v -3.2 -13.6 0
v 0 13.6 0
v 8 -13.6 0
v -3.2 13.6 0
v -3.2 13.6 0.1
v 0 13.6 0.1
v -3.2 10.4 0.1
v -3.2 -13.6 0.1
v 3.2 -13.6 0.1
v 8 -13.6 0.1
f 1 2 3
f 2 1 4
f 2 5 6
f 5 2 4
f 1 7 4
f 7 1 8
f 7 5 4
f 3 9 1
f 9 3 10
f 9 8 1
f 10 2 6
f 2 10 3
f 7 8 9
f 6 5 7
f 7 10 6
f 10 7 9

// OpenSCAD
// file: ../p/4-4edge.scad
use <../lib.scad>
$fa=1; $fs=0.2;
function ldraw_lib__4_4edge(realsolid=false) = [
// 0 Circle 1.0
// 0 Name: 4-4edge.dat
// 0 Author: James Jessiman
// 0 !LDRAW_ORG Primitive UPDATE 2017-01
// 0 !LICENSE Licensed under CC BY 2.0 and CC BY 4.0 : see CAreadme.txt
// 
// 0 BFC CERTIFY CCW
  [0,"BFC","CERTIFY"],
  [0,"BFC","CCW"],
// 
// 0 !HISTORY 1998-12-15 [PTadmin] Official Update 1998-10
// 0 !HISTORY 2005-12-28 [PTadmin] Official Update 2005-01
// 0 !HISTORY 2007-06-24 [PTadmin] Header formatted for Contributor Agreement
// 0 !HISTORY 2008-07-01 [PTadmin] Official Update 2008-01
// 0 !HISTORY 2017-01-15 [Steffen] BFCed
// 0 !HISTORY 2017-12-30 [PTadmin] Official Update 2017-01
// 
// 
// 2 24 1 0 0 0.9239 0 0.3827
  [2,24,1,0,0,0.9239,0,0.3827],
// 2 24 0.9239 0 0.3827 0.7071 0 0.7071
  [2,24,0.9239,0,0.3827,0.7071,0,0.7071],
// 2 24 0.7071 0 0.7071 0.3827 0 0.9239
  [2,24,0.7071,0,0.7071,0.3827,0,0.9239],
// 2 24 0.3827 0 0.9239 0 0 1
  [2,24,0.3827,0,0.9239,0,0,1],
// 2 24 0 0 1 -0.3827 0 0.9239
  [2,24,0,0,1,-0.3827,0,0.9239],
// 2 24 -0.3827 0 0.9239 -0.7071 0 0.7071
  [2,24,-0.3827,0,0.9239,-0.7071,0,0.7071],
// 2 24 -0.7071 0 0.7071 -0.9239 0 0.3827
  [2,24,-0.7071,0,0.7071,-0.9239,0,0.3827],
// 2 24 -0.9239 0 0.3827 -1 0 -0
  [2,24,-0.9239,0,0.3827,-1,0,-0],
// 2 24 -1 0 -0 -0.9239 0 -0.3827
  [2,24,-1,0,-0,-0.9239,0,-0.3827],
// 2 24 -0.9239 0 -0.3827 -0.7071 0 -0.7071
  [2,24,-0.9239,0,-0.3827,-0.7071,0,-0.7071],
// 2 24 -0.7071 0 -0.7071 -0.3827 0 -0.9239
  [2,24,-0.7071,0,-0.7071,-0.3827,0,-0.9239],
// 2 24 -0.3827 0 -0.9239 0 0 -1
  [2,24,-0.3827,0,-0.9239,0,0,-1],
// 2 24 0 0 -1 0.3827 0 -0.9239
  [2,24,0,0,-1,0.3827,0,-0.9239],
// 2 24 0.3827 0 -0.9239 0.7071 0 -0.7071
  [2,24,0.3827,0,-0.9239,0.7071,0,-0.7071],
// 2 24 0.7071 0 -0.7071 0.9239 0 -0.3827
  [2,24,0.7071,0,-0.7071,0.9239,0,-0.3827],
// 2 24 0.9239 0 -0.3827 1 0 0
  [2,24,0.9239,0,-0.3827,1,0,0],
];
module ldraw_lib__4_4edge(step=0, col=false, unit=2/5, alt=false, line=0.2, solid=!$preview)
    makepoly(ldraw_lib__4_4edge(solid), step=step, col=col, unit=unit, alt=alt, line=line, solid=solid);
ldraw_lib__4_4edge(line=0.2);
// file: ../p/4-4disc.scad
use <../lib.scad>
$fa=1; $fs=0.2;
function ldraw_lib__4_4disc(realsolid=false) = [
// 0 Disc 1.0
// 0 Name: 4-4disc.dat
// 0 Author: James Jessiman
// 0 !LDRAW_ORG Primitive UPDATE 2002-02
// 0 !LICENSE Licensed under CC BY 2.0 and CC BY 4.0 : see CAreadme.txt
// 
// 0 BFC CERTIFY CCW
  [0,"BFC","CERTIFY"],
  [0,"BFC","CCW"],
// 
// 0 !HISTORY 1998-12-15 [PTadmin] Official Update 1998-10
// 0 !HISTORY 2002-03-23 [sbliss] Added BFC statement
// 0 !HISTORY 2002-04-25 [PTadmin] Official Update 2002-02
// 0 !HISTORY 2007-06-24 [PTadmin] Header formatted for Contributor Agreement
// 0 !HISTORY 2008-07-01 [PTadmin] Official Update 2008-01
// 
// 
// 3 16 0 0 0 1 0 0 0.9239 0 0.3827
  [3,16,0,0,0,1,0,0,0.9239,0,0.3827],
// 3 16 0 0 0 0.9239 0 0.3827 0.7071 0 0.7071
  [3,16,0,0,0,0.9239,0,0.3827,0.7071,0,0.7071],
// 3 16 0 0 0 0.7071 0 0.7071 0.3827 0 0.9239
  [3,16,0,0,0,0.7071,0,0.7071,0.3827,0,0.9239],
// 3 16 0 0 0 0.3827 0 0.9239 0 0 1
  [3,16,0,0,0,0.3827,0,0.9239,0,0,1],
// 3 16 0 0 0 0 0 1 -0.3827 0 0.9239
  [3,16,0,0,0,0,0,1,-0.3827,0,0.9239],
// 3 16 0 0 0 -0.3827 0 0.9239 -0.7071 0 0.7071
  [3,16,0,0,0,-0.3827,0,0.9239,-0.7071,0,0.7071],
// 3 16 0 0 0 -0.7071 0 0.7071 -0.9239 0 0.3827
  [3,16,0,0,0,-0.7071,0,0.7071,-0.9239,0,0.3827],
// 3 16 0 0 0 -0.9239 0 0.3827 -1 0 -0
  [3,16,0,0,0,-0.9239,0,0.3827,-1,0,-0],
// 3 16 0 0 0 -1 0 -0 -0.9239 0 -0.3827
  [3,16,0,0,0,-1,0,-0,-0.9239,0,-0.3827],
// 3 16 0 0 0 -0.9239 0 -0.3827 -0.7071 0 -0.7071
  [3,16,0,0,0,-0.9239,0,-0.3827,-0.7071,0,-0.7071],
// 3 16 0 0 0 -0.7071 0 -0.7071 -0.3827 0 -0.9239
  [3,16,0,0,0,-0.7071,0,-0.7071,-0.3827,0,-0.9239],
// 3 16 0 0 0 -0.3827 0 -0.9239 0 0 -1
  [3,16,0,0,0,-0.3827,0,-0.9239,0,0,-1],
// 3 16 0 0 0 0 0 -1 0.3827 0 -0.9239
  [3,16,0,0,0,0,0,-1,0.3827,0,-0.9239],
// 3 16 0 0 0 0.3827 0 -0.9239 0.7071 0 -0.7071
  [3,16,0,0,0,0.3827,0,-0.9239,0.7071,0,-0.7071],
// 3 16 0 0 0 0.7071 0 -0.7071 0.9239 0 -0.3827
  [3,16,0,0,0,0.7071,0,-0.7071,0.9239,0,-0.3827],
// 3 16 0 0 0 0.9239 0 -0.3827 1 0 0
  [3,16,0,0,0,0.9239,0,-0.3827,1,0,0],
// 0
];
module ldraw_lib__4_4disc(step=0, col=false, unit=2/5, alt=false, line=0.2, solid=!$preview)
    makepoly(ldraw_lib__4_4disc(solid), step=step, col=col, unit=unit, alt=alt, line=line, solid=solid);
ldraw_lib__4_4disc(line=0.2);
// file: ../p/4-4cyli.scad
use <../lib.scad>
$fa=1; $fs=0.2;
function ldraw_lib__4_4cyli(realsolid=false) = [
// 0 Cylinder 1.0
// 0 Name: 4-4cyli.dat
// 0 Author: James Jessiman
// 0 !LDRAW_ORG Primitive UPDATE 2005-01
// 0 !LICENSE Licensed under CC BY 2.0 and CC BY 4.0 : see CAreadme.txt
// 
// 0 BFC CERTIFY CCW
  [0,"BFC","CERTIFY"],
  [0,"BFC","CCW"],
// 
// 0 !HISTORY 1998-12-15 [PTadmin] Official Update 1998-10
// 0 !HISTORY 2002-03-23 [sbliss] Added BFC statement; merged headers from files in distributions LDraw 0.27 and Complete.
// 0 !HISTORY 2002-04-25 [PTadmin] Official Update 2002-02
// 0 !HISTORY 2004-12-14 [guyvivan] BFC CCW
// 0 !HISTORY 2005-12-28 [PTadmin] Official Update 2005-01
// 0 !HISTORY 2007-06-24 [PTadmin] Header formatted for Contributor Agreement
// 0 !HISTORY 2008-07-01 [PTadmin] Official Update 2008-01
// 
// 
// 4 16 1 1 0 0.9239 1 0.3827 0.9239 0 0.3827 1 0 0
  [4,16,1,1,0,0.9239,1,0.3827,0.9239,0,0.3827,1,0,0],
// 5 24 1 0 0 1 1 0 0.9239 0 0.3827 0.9239 0 -0.3827
  [5,24,1,0,0,1,1,0,0.9239,0,0.3827,0.9239,0,-0.3827],
// 4 16 0.9239 1 0.3827 0.7071 1 0.7071 0.7071 0 0.7071 0.9239 0 0.3827
  [4,16,0.9239,1,0.3827,0.7071,1,0.7071,0.7071,0,0.7071,0.9239,0,0.3827],
// 5 24 0.9239 0 0.3827 0.9239 1 0.3827 0.7071 0 0.7071 1 0 0
  [5,24,0.9239,0,0.3827,0.9239,1,0.3827,0.7071,0,0.7071,1,0,0],
// 4 16 0.7071 1 0.7071 0.3827 1 0.9239 0.3827 0 0.9239 0.7071 0 0.7071
  [4,16,0.7071,1,0.7071,0.3827,1,0.9239,0.3827,0,0.9239,0.7071,0,0.7071],
// 5 24 0.7071 0 0.7071 0.7071 1 0.7071 0.3827 0 0.9239 0.9239 0 0.3827
  [5,24,0.7071,0,0.7071,0.7071,1,0.7071,0.3827,0,0.9239,0.9239,0,0.3827],
// 4 16 0.3827 1 0.9239 0 1 1 0 0 1 0.3827 0 0.9239
  [4,16,0.3827,1,0.9239,0,1,1,0,0,1,0.3827,0,0.9239],
// 5 24 0.3827 0 0.9239 0.3827 1 0.9239 0 0 1 0.7071 0 0.7071
  [5,24,0.3827,0,0.9239,0.3827,1,0.9239,0,0,1,0.7071,0,0.7071],
// 4 16 0 1 1 -0.3827 1 0.9239 -0.3827 0 0.9239 0 0 1
  [4,16,0,1,1,-0.3827,1,0.9239,-0.3827,0,0.9239,0,0,1],
// 5 24 0 0 1 0 1 1 -0.3827 0 0.9239 0.3827 0 0.9239
  [5,24,0,0,1,0,1,1,-0.3827,0,0.9239,0.3827,0,0.9239],
// 4 16 -0.3827 1 0.9239 -0.7071 1 0.7071 -0.7071 0 0.7071 -0.3827 0 0.9239
  [4,16,-0.3827,1,0.9239,-0.7071,1,0.7071,-0.7071,0,0.7071,-0.3827,0,0.9239],
// 5 24 -0.3827 0 0.9239 -0.3827 1 0.9239 -0.7071 0 0.7071 0 0 1
  [5,24,-0.3827,0,0.9239,-0.3827,1,0.9239,-0.7071,0,0.7071,0,0,1],
// 4 16 -0.7071 1 0.7071 -0.9239 1 0.3827 -0.9239 0 0.3827 -0.7071 0 0.7071
  [4,16,-0.7071,1,0.7071,-0.9239,1,0.3827,-0.9239,0,0.3827,-0.7071,0,0.7071],
// 5 24 -0.7071 0 0.7071 -0.7071 1 0.7071 -0.9239 0 0.3827 -0.3827 0 0.9239
  [5,24,-0.7071,0,0.7071,-0.7071,1,0.7071,-0.9239,0,0.3827,-0.3827,0,0.9239],
// 4 16 -0.9239 1 0.3827 -1 1 0 -1 0 0 -0.9239 0 0.3827
  [4,16,-0.9239,1,0.3827,-1,1,0,-1,0,0,-0.9239,0,0.3827],
// 5 24 -0.9239 0 0.3827 -0.9239 1 0.3827 -1 0 0 -0.7071 0 0.7071
  [5,24,-0.9239,0,0.3827,-0.9239,1,0.3827,-1,0,0,-0.7071,0,0.7071],
// 4 16 -1 1 0 -0.9239 1 -0.3827 -0.9239 0 -0.3827 -1 0 0
  [4,16,-1,1,0,-0.9239,1,-0.3827,-0.9239,0,-0.3827,-1,0,0],
// 5 24 -1 0 0 -1 1 0 -0.9239 0 -0.3827 -0.9239 0 0.3827
  [5,24,-1,0,0,-1,1,0,-0.9239,0,-0.3827,-0.9239,0,0.3827],
// 4 16 -0.9239 1 -0.3827 -0.7071 1 -0.7071 -0.7071 0 -0.7071 -0.9239 0 -0.3827
  [4,16,-0.9239,1,-0.3827,-0.7071,1,-0.7071,-0.7071,0,-0.7071,-0.9239,0,-0.3827],
// 5 24 -0.9239 0 -0.3827 -0.9239 1 -0.3827 -0.7071 0 -0.7071 -1 0 0
  [5,24,-0.9239,0,-0.3827,-0.9239,1,-0.3827,-0.7071,0,-0.7071,-1,0,0],
// 4 16 -0.7071 1 -0.7071 -0.3827 1 -0.9239 -0.3827 0 -0.9239 -0.7071 0 -0.7071
  [4,16,-0.7071,1,-0.7071,-0.3827,1,-0.9239,-0.3827,0,-0.9239,-0.7071,0,-0.7071],
// 5 24 -0.7071 0 -0.7071 -0.7071 1 -0.7071 -0.3827 0 -0.9239 -0.9239 0 -0.3827
  [5,24,-0.7071,0,-0.7071,-0.7071,1,-0.7071,-0.3827,0,-0.9239,-0.9239,0,-0.3827],
// 4 16 -0.3827 1 -0.9239 0 1 -1 0 0 -1 -0.3827 0 -0.9239
  [4,16,-0.3827,1,-0.9239,0,1,-1,0,0,-1,-0.3827,0,-0.9239],
// 5 24 -0.3827 0 -0.9239 -0.3827 1 -0.9239 0 0 -1 -0.7071 0 -0.7071
  [5,24,-0.3827,0,-0.9239,-0.3827,1,-0.9239,0,0,-1,-0.7071,0,-0.7071],
// 4 16 0 1 -1 0.3827 1 -0.9239 0.3827 0 -0.9239 0 0 -1
  [4,16,0,1,-1,0.3827,1,-0.9239,0.3827,0,-0.9239,0,0,-1],
// 5 24 0 0 -1 0 1 -1 0.3827 0 -0.9239 -0.3827 0 -0.9239
  [5,24,0,0,-1,0,1,-1,0.3827,0,-0.9239,-0.3827,0,-0.9239],
// 4 16 0.3827 1 -0.9239 0.7071 1 -0.7071 0.7071 0 -0.7071 0.3827 0 -0.9239
  [4,16,0.3827,1,-0.9239,0.7071,1,-0.7071,0.7071,0,-0.7071,0.3827,0,-0.9239],
// 5 24 0.3827 0 -0.9239 0.3827 1 -0.9239 0.7071 0 -0.7071 0 0 -1
  [5,24,0.3827,0,-0.9239,0.3827,1,-0.9239,0.7071,0,-0.7071,0,0,-1],
// 4 16 0.7071 1 -0.7071 0.9239 1 -0.3827 0.9239 0 -0.3827 0.7071 0 -0.7071
  [4,16,0.7071,1,-0.7071,0.9239,1,-0.3827,0.9239,0,-0.3827,0.7071,0,-0.7071],
// 5 24 0.7071 0 -0.7071 0.7071 1 -0.7071 0.9239 0 -0.3827 0.3827 0 -0.9239
  [5,24,0.7071,0,-0.7071,0.7071,1,-0.7071,0.9239,0,-0.3827,0.3827,0,-0.9239],
// 4 16 0.9239 1 -0.3827 1 1 0 1 0 0 0.9239 0 -0.3827
  [4,16,0.9239,1,-0.3827,1,1,0,1,0,0,0.9239,0,-0.3827],
// 5 24 0.9239 0 -0.3827 0.9239 1 -0.3827 1 0 0 0.7071 0 -0.7071
  [5,24,0.9239,0,-0.3827,0.9239,1,-0.3827,1,0,0,0.7071,0,-0.7071],
// 0
];
module ldraw_lib__4_4cyli(step=0, col=false, unit=2/5, alt=false, line=0.2, solid=!$preview)
    makepoly(ldraw_lib__4_4cyli(solid), step=step, col=col, unit=unit, alt=alt, line=line, solid=solid);
ldraw_lib__4_4cyli(line=0.2);
// file: ../p/stud3.scad
use <../lib.scad>
use <4-4cyli.scad>
use <4-4disc.scad>
use <4-4edge.scad>
$fa=1; $fs=0.2;
function ldraw_lib__stud3(realsolid=false) = realsolid ? 
    [openscad(translate([0,0,-eps()], o=cylinder(4+eps(), r=4)),2)] : [
// 0 Stud Tube Solid
// 0 Name: stud3.dat
// 0 Author: James Jessiman
// 0 !LDRAW_ORG Primitive UPDATE 2012-01
// 0 !LICENSE Licensed under CC BY 2.0 and CC BY 4.0 : see CAreadme.txt
// 
// 0 BFC CERTIFY CCW
  [0,"BFC","CERTIFY"],
  [0,"BFC","CCW"],
// 
// 0 !HISTORY 2002-04-04 [sbliss] Modified for BFC compliance
// 0 !HISTORY 2002-04-25 [PTadmin] Official Update 2002-02
// 0 !HISTORY 2007-06-24 [PTadmin] Header formatted for Contributor Agreement
// 0 !HISTORY 2008-07-01 [PTadmin] Official Update 2008-01
// 0 !HISTORY 2012-02-16 [Philo] Changed to CCW
// 0 !HISTORY 2012-03-30 [PTadmin] Official Update 2012-01
// 
// 
// 1 16 0 -4 0 4 0 0 0 1 0 0 0 4 4-4edge.dat
  [1,16,0,-4,0,4,0,0,0,1,0,0,0,4, ldraw_lib__4_4edge(realsolid)],
// 1 16 0 0 0 4 0 0 0 1 0 0 0 4 4-4edge.dat
  [1,16,0,0,0,4,0,0,0,1,0,0,0,4, ldraw_lib__4_4edge(realsolid)],
// 1 16 0 -4 0 4 0 0 0 1 0 0 0 4 4-4disc.dat
  [1,16,0,-4,0,4,0,0,0,1,0,0,0,4, ldraw_lib__4_4disc(realsolid)],
// 1 16 0 -4 0 4 0 0 0 4 0 0 0 4 4-4cyli.dat
  [1,16,0,-4,0,4,0,0,0,4,0,0,0,4, ldraw_lib__4_4cyli(realsolid)],
];
module ldraw_lib__stud3(step=0, col=false, unit=2/5, alt=false, line=0.2, solid=!$preview)
    makepoly(ldraw_lib__stud3(solid), step=step, col=col, unit=unit, alt=alt, line=line, solid=solid);
ldraw_lib__stud3(line=0.2);
// file: ../p/stud.scad
use <../lib.scad>
use <4-4cyli.scad>
use <4-4disc.scad>
use <4-4edge.scad>
$fa=1; $fs=0.2;
function ldraw_lib__stud(realsolid=false) = realsolid ? 
    [openscad(translate([0,0,-eps()], o=cylinder(4+eps(), r=6)),2)] : [
// 0 Stud
// 0 Name: stud.dat
// 0 Author: James Jessiman
// 0 !LDRAW_ORG Primitive UPDATE 2012-01
// 0 !LICENSE Licensed under CC BY 2.0 and CC BY 4.0 : see CAreadme.txt
// 
// 0 BFC CERTIFY CCW
  [0,"BFC","CERTIFY"],
  [0,"BFC","CCW"],
// 
// 0 !HISTORY 2002-04-04 [sbliss] Modified for BFC compliance
// 0 !HISTORY 2002-04-25 [PTadmin] Official Update 2002-02
// 0 !HISTORY 2007-06-24 [PTadmin] Header formatted for Contributor Agreement
// 0 !HISTORY 2008-07-01 [PTadmin] Official Update 2008-01
// 0 !HISTORY 2012-02-16 [Philo] Changed to CCW
// 0 !HISTORY 2012-03-30 [PTadmin] Official Update 2012-01
// 
// 
// 1 16 0 0 0 6 0 0 0 1 0 0 0 6 4-4edge.dat
  [1,16,0,0,0,6,0,0,0,1,0,0,0,6, ldraw_lib__4_4edge(realsolid)],
// 1 16 0 -4 0 6 0 0 0 1 0 0 0 6 4-4edge.dat
  [1,16,0,-4,0,6,0,0,0,1,0,0,0,6, ldraw_lib__4_4edge(realsolid)],
// 1 16 0 0 0 6 0 0 0 -4 0 0 0 6 4-4cyli.dat
  [1,16,0,0,0,6,0,0,0,-4,0,0,0,6, ldraw_lib__4_4cyli(realsolid)],
// 1 16 0 -4 0 6 0 0 0 1 0 0 0 6 4-4disc.dat
  [1,16,0,-4,0,6,0,0,0,1,0,0,0,6, ldraw_lib__4_4disc(realsolid)],
];
module ldraw_lib__stud(step=0, col=false, unit=2/5, alt=false, line=0.2, solid=!$preview)
    makepoly(ldraw_lib__stud(solid), step=step, col=col, unit=unit, alt=alt, line=line, solid=solid);
ldraw_lib__stud(line=0.2);
// file: ../p/box5.scad
use <../lib.scad>
$fa=1; $fs=0.2;
function ldraw_lib__box5(realsolid=false) = [
// 0 Box with 5 Faces and All Edges
// 0 Name: box5.dat
// 0 Author: James Jessiman
// 0 !LDRAW_ORG Primitive UPDATE 2012-01
// 0 !LICENSE Licensed under CC BY 2.0 and CC BY 4.0 : see CAreadme.txt
// 
// 0 BFC CERTIFY CCW
  [0,"BFC","CERTIFY"],
  [0,"BFC","CCW"],
// 
// 0 !HISTORY 2002-04-03 [sbliss] Modified for BFC compliance
// 0 !HISTORY 2002-04-25 [PTadmin] Official Update 2002-02
// 0 !HISTORY 2007-06-24 [PTadmin] Header formatted for Contributor Agreement
// 0 !HISTORY 2008-07-01 [PTadmin] Official Update 2008-01
// 0 !HISTORY 2012-02-16 [Philo] Changed to CCW
// 0 !HISTORY 2012-03-30 [PTadmin] Official Update 2012-01
// 
// 
// 2 24 1 1 1 -1 1 1
  [2,24,1,1,1,-1,1,1],
// 2 24 -1 1 1 -1 1 -1
  [2,24,-1,1,1,-1,1,-1],
// 2 24 -1 1 -1 1 1 -1
  [2,24,-1,1,-1,1,1,-1],
// 2 24 1 1 -1 1 1 1
  [2,24,1,1,-1,1,1,1],
// 2 24 1 0 1 -1 0 1
  [2,24,1,0,1,-1,0,1],
// 2 24 -1 0 1 -1 0 -1
  [2,24,-1,0,1,-1,0,-1],
// 2 24 -1 0 -1 1 0 -1
  [2,24,-1,0,-1,1,0,-1],
// 2 24 1 0 -1 1 0 1
  [2,24,1,0,-1,1,0,1],
// 2 24 1 0 1 1 1 1
  [2,24,1,0,1,1,1,1],
// 2 24 -1 0 1 -1 1 1
  [2,24,-1,0,1,-1,1,1],
// 2 24 1 0 -1 1 1 -1
  [2,24,1,0,-1,1,1,-1],
// 2 24 -1 0 -1 -1 1 -1
  [2,24,-1,0,-1,-1,1,-1],
// 4 16 -1 1 1 1 1 1 1 1 -1 -1 1 -1
  [4,16,-1,1,1,1,1,1,1,1,-1,-1,1,-1],
// 4 16 -1 1 1 -1 0 1 1 0 1 1 1 1
  [4,16,-1,1,1,-1,0,1,1,0,1,1,1,1],
// 4 16 -1 1 -1 -1 0 -1 -1 0 1 -1 1 1
  [4,16,-1,1,-1,-1,0,-1,-1,0,1,-1,1,1],
// 4 16 1 1 -1 1 0 -1 -1 0 -1 -1 1 -1
  [4,16,1,1,-1,1,0,-1,-1,0,-1,-1,1,-1],
// 4 16 1 1 1 1 0 1 1 0 -1 1 1 -1
  [4,16,1,1,1,1,0,1,1,0,-1,1,1,-1],
];
module ldraw_lib__box5(step=0, col=false, unit=2/5, alt=false, line=0.2, solid=!$preview)
    makepoly(ldraw_lib__box5(solid), step=step, col=col, unit=unit, alt=alt, line=line, solid=solid);
ldraw_lib__box5(line=0.2);
// file: ../p/box4t.scad
use <../lib.scad>
$fa=1; $fs=0.2;
function ldraw_lib__box4t(realsolid=false) = [
// 0 Box with 4 Adjacent Faces and All Edges
// 0 Name: box4t.dat
// 0 Author: Tore Eriksson [Tore_Eriksson]
// 0 !LDRAW_ORG Primitive UPDATE 2003-02
// 0 !LICENSE Licensed under CC BY 2.0 and CC BY 4.0 : see CAreadme.txt
// 
// 0 BFC CERTIFY CCW
  [0,"BFC","CERTIFY"],
  [0,"BFC","CCW"],
// 
// 0 !HISTORY 1997-09-29 [PTadmin] Official Update 1997-15
// 0 !HISTORY 2002-08-31 [izanette] Modified with WINDZ for BFC compliance
// 0 !HISTORY 2003-08-01 [PTadmin] Official Update 2003-02
// 0 !HISTORY 2007-06-24 [PTadmin] Header formatted for Contributor Agreement
// 0 !HISTORY 2008-07-01 [PTadmin] Official Update 2008-01
// 
// 
// 2 24 1 1 1 -1 1 1
  [2,24,1,1,1,-1,1,1],
// 2 24 -1 1 1 -1 1 -1
  [2,24,-1,1,1,-1,1,-1],
// 2 24 -1 1 -1 1 1 -1
  [2,24,-1,1,-1,1,1,-1],
// 2 24 1 1 -1 1 1 1
  [2,24,1,1,-1,1,1,1],
// 2 24 1 0 1 -1 0 1
  [2,24,1,0,1,-1,0,1],
// 2 24 -1 0 1 -1 0 -1
  [2,24,-1,0,1,-1,0,-1],
// 2 24 -1 0 -1 1 0 -1
  [2,24,-1,0,-1,1,0,-1],
// 2 24 1 0 -1 1 0 1
  [2,24,1,0,-1,1,0,1],
// 2 24 1 0 1 1 1 1
  [2,24,1,0,1,1,1,1],
// 2 24 -1 0 1 -1 1 1
  [2,24,-1,0,1,-1,1,1],
// 2 24 1 0 -1 1 1 -1
  [2,24,1,0,-1,1,1,-1],
// 2 24 -1 0 -1 -1 1 -1
  [2,24,-1,0,-1,-1,1,-1],
// 4 16 1 1 1 1 1 -1 -1 1 -1 -1 1 1
  [4,16,1,1,1,1,1,-1,-1,1,-1,-1,1,1],
// 4 16 1 1 1 -1 1 1 -1 0 1 1 0 1
  [4,16,1,1,1,-1,1,1,-1,0,1,1,0,1],
// 4 16 -1 1 1 -1 1 -1 -1 0 -1 -1 0 1
  [4,16,-1,1,1,-1,1,-1,-1,0,-1,-1,0,1],
// 0 4 16 -1 1 -1 -1 0 -1 1 0 -1 1 1 -1
// 4 16 1 1 -1 1 1 1 1 0 1 1 0 -1
  [4,16,1,1,-1,1,1,1,1,0,1,1,0,-1],
// 0
];
module ldraw_lib__box4t(step=0, col=false, unit=2/5, alt=false, line=0.2, solid=!$preview)
    makepoly(ldraw_lib__box4t(solid), step=step, col=col, unit=unit, alt=alt, line=line, solid=solid);
ldraw_lib__box4t(line=0.2);
// file: s/3004s01.scad
use <../../lib.scad>
use <../../p/box4t.scad>
use <../../p/box5.scad>
use <../../p/stud.scad>
use <../../p/stud3.scad>
$fa=1; $fs=0.2;
function ldraw_lib__s__3004s01(realsolid=false) = [
// 0 ~Brick  1 x  2 without Front Face
// 0 Name: s\3004s01.dat
// 0 Author: James Jessiman
// 0 !LDRAW_ORG Subpart UPDATE 2003-03
// 0 !LICENSE Licensed under CC BY 2.0 and CC BY 4.0 : see CAreadme.txt
// 
// 0 BFC CERTIFY CCW
  [0,"BFC","CERTIFY"],
  [0,"BFC","CCW"],
// 
// 0 !HISTORY 2003-09-07 [jriley] Subfiling, BFC
// 0 !HISTORY 2003-12-19 [PTadmin] Official Update 2003-03
// 0 !HISTORY 2007-08-29 [PTadmin] Header formatted for Contributor Agreement
// 0 !HISTORY 2008-07-01 [PTadmin] Official Update 2008-01
// 
// 
// 1 16 0 4 0 1 0 0 0 -5 0 0 0 1 stud3.dat
  [1,16,0,4,0,1,0,0,0,-5,0,0,0,1, ldraw_lib__stud3(realsolid)],
// 0 BFC INVERTNEXT
  [0,"BFC","INVERTNEXT"],
// 1 16 0 24 0 16 0 0 0 -20 0 0 0 6 box5.dat
  [1,16,0,24,0,16,0,0,0,-20,0,0,0,6, ldraw_lib__box5(realsolid)],
// 4 16 20 24 10 16 24 6 -16 24 6 -20 24 10
  [4,16,20,24,10,16,24,6,-16,24,6,-20,24,10],
// 4 16 -20 24 10 -16 24 6 -16 24 -6 -20 24 -10
  [4,16,-20,24,10,-16,24,6,-16,24,-6,-20,24,-10],
// 4 16 -20 24 -10 -16 24 -6 16 24 -6 20 24 -10
  [4,16,-20,24,-10,-16,24,-6,16,24,-6,20,24,-10],
// 4 16 20 24 -10 16 24 -6 16 24 6 20 24 10
  [4,16,20,24,-10,16,24,-6,16,24,6,20,24,10],
// 1 16 0 24 0 20 0 0 0 -24 0 0 0 10 box4t.dat
  [1,16,0,24,0,20,0,0,0,-24,0,0,0,10, ldraw_lib__box4t(realsolid)],
// 1 16 10 0 0 1 0 0 0 1 0 0 0 1 stud.dat
  [1,16,10,0,0,1,0,0,0,1,0,0,0,1, ldraw_lib__stud(realsolid)],
// 1 16 -10 0 0 1 0 0 0 1 0 0 0 1 stud.dat
  [1,16,-10,0,0,1,0,0,0,1,0,0,0,1, ldraw_lib__stud(realsolid)],
// 0
];
module ldraw_lib__s__3004s01(step=0, col=false, unit=2/5, alt=false, line=0.2, solid=!$preview)
    makepoly(ldraw_lib__s__3004s01(solid), step=step, col=col, unit=unit, alt=alt, line=line, solid=solid);
ldraw_lib__s__3004s01(line=0.2);
// file: 3004.scad
use <../lib.scad>
use <s/3004s01.scad>
$fa=1; $fs=0.2;
function ldraw_lib__3004(realsolid=false) = [
// 0 Brick  1 x  2
// 0 Name: 3004.dat
// 0 Author: James Jessiman
// 0 !LDRAW_ORG Part UPDATE 2022-05
// 0 !LICENSE Licensed under CC BY 2.0 and CC BY 4.0 : see CAreadme.txt
// 
// 0 BFC CERTIFY CCW
  [0,"BFC","CERTIFY"],
  [0,"BFC","CCW"],
// 
// 0 !HISTORY 2001-10-26 [PTadmin] Official Update 2001-01
// 0 !HISTORY 2002-05-07 {unknown} BFC Certification
// 0 !HISTORY 2002-06-11 [PTadmin] Official Update 2002-03
// 0 !HISTORY 2007-05-07 [PTadmin] Header formatted for Contributor Agreement
// 0 !HISTORY 2008-07-01 [PTadmin] Official Update 2008-01
// 0 !HISTORY 2022-08-04 [MagFors] Using subfile
// 0 !HISTORY 2022-09-15 [PTadmin] Official Update 2022-05
// 
// 
// 1 16 0 0 0 1 0 0 0 1 0 0 0 1 s\3004s01.dat
  [1,16,0,0,0,1,0,0,0,1,0,0,0,1, ldraw_lib__s__3004s01(realsolid)],
// 4 16 -20 24 -10 20 24 -10 20 0 -10 -20 0 -10
  [4,16,-20,24,-10,20,24,-10,20,0,-10,-20,0,-10],
];
module ldraw_lib__3004(step=0, col=false, unit=2/5, alt=false, line=0.2, solid=!$preview)
    makepoly(ldraw_lib__3004(solid), step=step, col=col, unit=unit, alt=alt, line=line, solid=solid);
ldraw_lib__3004(line=0.2);
// file: 6153754a.scad
use <../lib.scad>
$fa=1; $fs=0.2;
function ldraw_lib__6153754a(realsolid=false) = [
// 0 Sticker  3.4 x  1.4 with Dark Azure Volkswagen Left Front Window Pillar
// 0 Name: 6153754a.dat
// 0 Author: Magnus Forsberg [MagFors]
// 0 !LDRAW_ORG Part UPDATE 2016-01
// 0 !LICENSE Licensed under CC BY 2.0 and CC BY 4.0 : see CAreadme.txt
// 
// 0 BFC CERTIFY CCW
  [0,"BFC","CERTIFY"],
  [0,"BFC","CCW"],
// 
// 0 !KEYWORDS Beetle, set 10252, VW
// 
// 0 !HISTORY 2016-12-31 [PTadmin] Official Update 2016-01
// 
// 
// 4 16 0 0 34 8 0 34 8 0 -34 -20 0 -34
  [4,16,0,0,34,8,0,34,8,0,-34,-20,0,-34],
// 4 16 0 -0.25 34 8 -0.25 34 8 0 34 0 0 34
  [4,16,0,-0.25,34,8,-0.25,34,8,0,34,0,0,34],
// 4 16 8 -.25 26 8 -.25 -34 8 0 -34 8 0 34
  [4,16,8,-.25,26,8,-.25,-34,8,0,-34,8,0,34],
// 3 16 8 0 34 8 -.25 34 8 -.25 26
  [3,16,8,0,34,8,-.25,34,8,-.25,26],
// 4 16 -8 -.25 -34 -20 -.25 -34 -20 0 -34 8 0 -34
  [4,16,-8,-.25,-34,-20,-.25,-34,-20,0,-34,8,0,-34],
// 3 16 8 0 -34 8 -.25 -34 -8 -.25 -34
  [3,16,8,0,-34,8,-.25,-34,-8,-.25,-34],
// 4 16 -20 -0.25 -34 0 -0.25 34 0 0 34 -20 0 -34
  [4,16,-20,-0.25,-34,0,-0.25,34,0,0,34,-20,0,-34],
// 3 16 -8 -.25 -34 8 -.25 -34 8 -.25 26
  [3,16,-8,-.25,-34,8,-.25,-34,8,-.25,26],
// 0 BFC NOCLIP
  [0,"BFC","NOCLIP"],
// 3 321 8 -.25 26 8 -.25 34 0 -.25 34
  [3,321,8,-.25,26,8,-.25,34,0,-.25,34],
// 4 321 -20 -.25 -34 -8 -.25 -34 8 -.25 26 0 -.25 34
  [4,321,-20,-.25,-34,-8,-.25,-34,8,-.25,26,0,-.25,34],
];
module ldraw_lib__6153754a(step=0, col=false, unit=2/5, alt=false, line=0.2, solid=!$preview)
    makepoly(ldraw_lib__6153754a(solid), step=step, col=col, unit=unit, alt=alt, line=line, solid=solid);
ldraw_lib__6153754a(line=0.2);
// main file
use <../lib.scad>
use <6153754a.scad>
$fa=1; $fs=0.2;
function ldraw_lib__6153754b(realsolid=false) = [
// 0 Sticker  3.4 x  1.4 with Dark Azure Volkswagen Right Front Window Pillar
// 0 Name: 6153754b.dat
// 0 Author: Magnus Forsberg [MagFors]
// 0 !LDRAW_ORG Part UPDATE 2016-01
// 0 !LICENSE Licensed under CC BY 2.0 and CC BY 4.0 : see CAreadme.txt
// 
// 0 BFC CERTIFY CCW
  [0,"BFC","CERTIFY"],
  [0,"BFC","CCW"],
// 
// 0 !KEYWORDS Beetle, set 10252, VW
// 
// 0 !HISTORY 2016-12-31 [PTadmin] Official Update 2016-01
// 
// 
// 1 16 0 0 0 -1 0 0 0 1 0 0 0 1 6153754a.dat
  [1,16,0,0,0,-1,0,0,0,1,0,0,0,1, ldraw_lib__6153754a(realsolid)],
];
module ldraw_lib__6153754b(step=0, col=false, unit=2/5, alt=false, line=0.2, solid=!$preview)
    makepoly(ldraw_lib__6153754b(solid), step=step, col=col, unit=unit, alt=alt, line=line, solid=solid);
ldraw_lib__6153754b(line=0.2);
